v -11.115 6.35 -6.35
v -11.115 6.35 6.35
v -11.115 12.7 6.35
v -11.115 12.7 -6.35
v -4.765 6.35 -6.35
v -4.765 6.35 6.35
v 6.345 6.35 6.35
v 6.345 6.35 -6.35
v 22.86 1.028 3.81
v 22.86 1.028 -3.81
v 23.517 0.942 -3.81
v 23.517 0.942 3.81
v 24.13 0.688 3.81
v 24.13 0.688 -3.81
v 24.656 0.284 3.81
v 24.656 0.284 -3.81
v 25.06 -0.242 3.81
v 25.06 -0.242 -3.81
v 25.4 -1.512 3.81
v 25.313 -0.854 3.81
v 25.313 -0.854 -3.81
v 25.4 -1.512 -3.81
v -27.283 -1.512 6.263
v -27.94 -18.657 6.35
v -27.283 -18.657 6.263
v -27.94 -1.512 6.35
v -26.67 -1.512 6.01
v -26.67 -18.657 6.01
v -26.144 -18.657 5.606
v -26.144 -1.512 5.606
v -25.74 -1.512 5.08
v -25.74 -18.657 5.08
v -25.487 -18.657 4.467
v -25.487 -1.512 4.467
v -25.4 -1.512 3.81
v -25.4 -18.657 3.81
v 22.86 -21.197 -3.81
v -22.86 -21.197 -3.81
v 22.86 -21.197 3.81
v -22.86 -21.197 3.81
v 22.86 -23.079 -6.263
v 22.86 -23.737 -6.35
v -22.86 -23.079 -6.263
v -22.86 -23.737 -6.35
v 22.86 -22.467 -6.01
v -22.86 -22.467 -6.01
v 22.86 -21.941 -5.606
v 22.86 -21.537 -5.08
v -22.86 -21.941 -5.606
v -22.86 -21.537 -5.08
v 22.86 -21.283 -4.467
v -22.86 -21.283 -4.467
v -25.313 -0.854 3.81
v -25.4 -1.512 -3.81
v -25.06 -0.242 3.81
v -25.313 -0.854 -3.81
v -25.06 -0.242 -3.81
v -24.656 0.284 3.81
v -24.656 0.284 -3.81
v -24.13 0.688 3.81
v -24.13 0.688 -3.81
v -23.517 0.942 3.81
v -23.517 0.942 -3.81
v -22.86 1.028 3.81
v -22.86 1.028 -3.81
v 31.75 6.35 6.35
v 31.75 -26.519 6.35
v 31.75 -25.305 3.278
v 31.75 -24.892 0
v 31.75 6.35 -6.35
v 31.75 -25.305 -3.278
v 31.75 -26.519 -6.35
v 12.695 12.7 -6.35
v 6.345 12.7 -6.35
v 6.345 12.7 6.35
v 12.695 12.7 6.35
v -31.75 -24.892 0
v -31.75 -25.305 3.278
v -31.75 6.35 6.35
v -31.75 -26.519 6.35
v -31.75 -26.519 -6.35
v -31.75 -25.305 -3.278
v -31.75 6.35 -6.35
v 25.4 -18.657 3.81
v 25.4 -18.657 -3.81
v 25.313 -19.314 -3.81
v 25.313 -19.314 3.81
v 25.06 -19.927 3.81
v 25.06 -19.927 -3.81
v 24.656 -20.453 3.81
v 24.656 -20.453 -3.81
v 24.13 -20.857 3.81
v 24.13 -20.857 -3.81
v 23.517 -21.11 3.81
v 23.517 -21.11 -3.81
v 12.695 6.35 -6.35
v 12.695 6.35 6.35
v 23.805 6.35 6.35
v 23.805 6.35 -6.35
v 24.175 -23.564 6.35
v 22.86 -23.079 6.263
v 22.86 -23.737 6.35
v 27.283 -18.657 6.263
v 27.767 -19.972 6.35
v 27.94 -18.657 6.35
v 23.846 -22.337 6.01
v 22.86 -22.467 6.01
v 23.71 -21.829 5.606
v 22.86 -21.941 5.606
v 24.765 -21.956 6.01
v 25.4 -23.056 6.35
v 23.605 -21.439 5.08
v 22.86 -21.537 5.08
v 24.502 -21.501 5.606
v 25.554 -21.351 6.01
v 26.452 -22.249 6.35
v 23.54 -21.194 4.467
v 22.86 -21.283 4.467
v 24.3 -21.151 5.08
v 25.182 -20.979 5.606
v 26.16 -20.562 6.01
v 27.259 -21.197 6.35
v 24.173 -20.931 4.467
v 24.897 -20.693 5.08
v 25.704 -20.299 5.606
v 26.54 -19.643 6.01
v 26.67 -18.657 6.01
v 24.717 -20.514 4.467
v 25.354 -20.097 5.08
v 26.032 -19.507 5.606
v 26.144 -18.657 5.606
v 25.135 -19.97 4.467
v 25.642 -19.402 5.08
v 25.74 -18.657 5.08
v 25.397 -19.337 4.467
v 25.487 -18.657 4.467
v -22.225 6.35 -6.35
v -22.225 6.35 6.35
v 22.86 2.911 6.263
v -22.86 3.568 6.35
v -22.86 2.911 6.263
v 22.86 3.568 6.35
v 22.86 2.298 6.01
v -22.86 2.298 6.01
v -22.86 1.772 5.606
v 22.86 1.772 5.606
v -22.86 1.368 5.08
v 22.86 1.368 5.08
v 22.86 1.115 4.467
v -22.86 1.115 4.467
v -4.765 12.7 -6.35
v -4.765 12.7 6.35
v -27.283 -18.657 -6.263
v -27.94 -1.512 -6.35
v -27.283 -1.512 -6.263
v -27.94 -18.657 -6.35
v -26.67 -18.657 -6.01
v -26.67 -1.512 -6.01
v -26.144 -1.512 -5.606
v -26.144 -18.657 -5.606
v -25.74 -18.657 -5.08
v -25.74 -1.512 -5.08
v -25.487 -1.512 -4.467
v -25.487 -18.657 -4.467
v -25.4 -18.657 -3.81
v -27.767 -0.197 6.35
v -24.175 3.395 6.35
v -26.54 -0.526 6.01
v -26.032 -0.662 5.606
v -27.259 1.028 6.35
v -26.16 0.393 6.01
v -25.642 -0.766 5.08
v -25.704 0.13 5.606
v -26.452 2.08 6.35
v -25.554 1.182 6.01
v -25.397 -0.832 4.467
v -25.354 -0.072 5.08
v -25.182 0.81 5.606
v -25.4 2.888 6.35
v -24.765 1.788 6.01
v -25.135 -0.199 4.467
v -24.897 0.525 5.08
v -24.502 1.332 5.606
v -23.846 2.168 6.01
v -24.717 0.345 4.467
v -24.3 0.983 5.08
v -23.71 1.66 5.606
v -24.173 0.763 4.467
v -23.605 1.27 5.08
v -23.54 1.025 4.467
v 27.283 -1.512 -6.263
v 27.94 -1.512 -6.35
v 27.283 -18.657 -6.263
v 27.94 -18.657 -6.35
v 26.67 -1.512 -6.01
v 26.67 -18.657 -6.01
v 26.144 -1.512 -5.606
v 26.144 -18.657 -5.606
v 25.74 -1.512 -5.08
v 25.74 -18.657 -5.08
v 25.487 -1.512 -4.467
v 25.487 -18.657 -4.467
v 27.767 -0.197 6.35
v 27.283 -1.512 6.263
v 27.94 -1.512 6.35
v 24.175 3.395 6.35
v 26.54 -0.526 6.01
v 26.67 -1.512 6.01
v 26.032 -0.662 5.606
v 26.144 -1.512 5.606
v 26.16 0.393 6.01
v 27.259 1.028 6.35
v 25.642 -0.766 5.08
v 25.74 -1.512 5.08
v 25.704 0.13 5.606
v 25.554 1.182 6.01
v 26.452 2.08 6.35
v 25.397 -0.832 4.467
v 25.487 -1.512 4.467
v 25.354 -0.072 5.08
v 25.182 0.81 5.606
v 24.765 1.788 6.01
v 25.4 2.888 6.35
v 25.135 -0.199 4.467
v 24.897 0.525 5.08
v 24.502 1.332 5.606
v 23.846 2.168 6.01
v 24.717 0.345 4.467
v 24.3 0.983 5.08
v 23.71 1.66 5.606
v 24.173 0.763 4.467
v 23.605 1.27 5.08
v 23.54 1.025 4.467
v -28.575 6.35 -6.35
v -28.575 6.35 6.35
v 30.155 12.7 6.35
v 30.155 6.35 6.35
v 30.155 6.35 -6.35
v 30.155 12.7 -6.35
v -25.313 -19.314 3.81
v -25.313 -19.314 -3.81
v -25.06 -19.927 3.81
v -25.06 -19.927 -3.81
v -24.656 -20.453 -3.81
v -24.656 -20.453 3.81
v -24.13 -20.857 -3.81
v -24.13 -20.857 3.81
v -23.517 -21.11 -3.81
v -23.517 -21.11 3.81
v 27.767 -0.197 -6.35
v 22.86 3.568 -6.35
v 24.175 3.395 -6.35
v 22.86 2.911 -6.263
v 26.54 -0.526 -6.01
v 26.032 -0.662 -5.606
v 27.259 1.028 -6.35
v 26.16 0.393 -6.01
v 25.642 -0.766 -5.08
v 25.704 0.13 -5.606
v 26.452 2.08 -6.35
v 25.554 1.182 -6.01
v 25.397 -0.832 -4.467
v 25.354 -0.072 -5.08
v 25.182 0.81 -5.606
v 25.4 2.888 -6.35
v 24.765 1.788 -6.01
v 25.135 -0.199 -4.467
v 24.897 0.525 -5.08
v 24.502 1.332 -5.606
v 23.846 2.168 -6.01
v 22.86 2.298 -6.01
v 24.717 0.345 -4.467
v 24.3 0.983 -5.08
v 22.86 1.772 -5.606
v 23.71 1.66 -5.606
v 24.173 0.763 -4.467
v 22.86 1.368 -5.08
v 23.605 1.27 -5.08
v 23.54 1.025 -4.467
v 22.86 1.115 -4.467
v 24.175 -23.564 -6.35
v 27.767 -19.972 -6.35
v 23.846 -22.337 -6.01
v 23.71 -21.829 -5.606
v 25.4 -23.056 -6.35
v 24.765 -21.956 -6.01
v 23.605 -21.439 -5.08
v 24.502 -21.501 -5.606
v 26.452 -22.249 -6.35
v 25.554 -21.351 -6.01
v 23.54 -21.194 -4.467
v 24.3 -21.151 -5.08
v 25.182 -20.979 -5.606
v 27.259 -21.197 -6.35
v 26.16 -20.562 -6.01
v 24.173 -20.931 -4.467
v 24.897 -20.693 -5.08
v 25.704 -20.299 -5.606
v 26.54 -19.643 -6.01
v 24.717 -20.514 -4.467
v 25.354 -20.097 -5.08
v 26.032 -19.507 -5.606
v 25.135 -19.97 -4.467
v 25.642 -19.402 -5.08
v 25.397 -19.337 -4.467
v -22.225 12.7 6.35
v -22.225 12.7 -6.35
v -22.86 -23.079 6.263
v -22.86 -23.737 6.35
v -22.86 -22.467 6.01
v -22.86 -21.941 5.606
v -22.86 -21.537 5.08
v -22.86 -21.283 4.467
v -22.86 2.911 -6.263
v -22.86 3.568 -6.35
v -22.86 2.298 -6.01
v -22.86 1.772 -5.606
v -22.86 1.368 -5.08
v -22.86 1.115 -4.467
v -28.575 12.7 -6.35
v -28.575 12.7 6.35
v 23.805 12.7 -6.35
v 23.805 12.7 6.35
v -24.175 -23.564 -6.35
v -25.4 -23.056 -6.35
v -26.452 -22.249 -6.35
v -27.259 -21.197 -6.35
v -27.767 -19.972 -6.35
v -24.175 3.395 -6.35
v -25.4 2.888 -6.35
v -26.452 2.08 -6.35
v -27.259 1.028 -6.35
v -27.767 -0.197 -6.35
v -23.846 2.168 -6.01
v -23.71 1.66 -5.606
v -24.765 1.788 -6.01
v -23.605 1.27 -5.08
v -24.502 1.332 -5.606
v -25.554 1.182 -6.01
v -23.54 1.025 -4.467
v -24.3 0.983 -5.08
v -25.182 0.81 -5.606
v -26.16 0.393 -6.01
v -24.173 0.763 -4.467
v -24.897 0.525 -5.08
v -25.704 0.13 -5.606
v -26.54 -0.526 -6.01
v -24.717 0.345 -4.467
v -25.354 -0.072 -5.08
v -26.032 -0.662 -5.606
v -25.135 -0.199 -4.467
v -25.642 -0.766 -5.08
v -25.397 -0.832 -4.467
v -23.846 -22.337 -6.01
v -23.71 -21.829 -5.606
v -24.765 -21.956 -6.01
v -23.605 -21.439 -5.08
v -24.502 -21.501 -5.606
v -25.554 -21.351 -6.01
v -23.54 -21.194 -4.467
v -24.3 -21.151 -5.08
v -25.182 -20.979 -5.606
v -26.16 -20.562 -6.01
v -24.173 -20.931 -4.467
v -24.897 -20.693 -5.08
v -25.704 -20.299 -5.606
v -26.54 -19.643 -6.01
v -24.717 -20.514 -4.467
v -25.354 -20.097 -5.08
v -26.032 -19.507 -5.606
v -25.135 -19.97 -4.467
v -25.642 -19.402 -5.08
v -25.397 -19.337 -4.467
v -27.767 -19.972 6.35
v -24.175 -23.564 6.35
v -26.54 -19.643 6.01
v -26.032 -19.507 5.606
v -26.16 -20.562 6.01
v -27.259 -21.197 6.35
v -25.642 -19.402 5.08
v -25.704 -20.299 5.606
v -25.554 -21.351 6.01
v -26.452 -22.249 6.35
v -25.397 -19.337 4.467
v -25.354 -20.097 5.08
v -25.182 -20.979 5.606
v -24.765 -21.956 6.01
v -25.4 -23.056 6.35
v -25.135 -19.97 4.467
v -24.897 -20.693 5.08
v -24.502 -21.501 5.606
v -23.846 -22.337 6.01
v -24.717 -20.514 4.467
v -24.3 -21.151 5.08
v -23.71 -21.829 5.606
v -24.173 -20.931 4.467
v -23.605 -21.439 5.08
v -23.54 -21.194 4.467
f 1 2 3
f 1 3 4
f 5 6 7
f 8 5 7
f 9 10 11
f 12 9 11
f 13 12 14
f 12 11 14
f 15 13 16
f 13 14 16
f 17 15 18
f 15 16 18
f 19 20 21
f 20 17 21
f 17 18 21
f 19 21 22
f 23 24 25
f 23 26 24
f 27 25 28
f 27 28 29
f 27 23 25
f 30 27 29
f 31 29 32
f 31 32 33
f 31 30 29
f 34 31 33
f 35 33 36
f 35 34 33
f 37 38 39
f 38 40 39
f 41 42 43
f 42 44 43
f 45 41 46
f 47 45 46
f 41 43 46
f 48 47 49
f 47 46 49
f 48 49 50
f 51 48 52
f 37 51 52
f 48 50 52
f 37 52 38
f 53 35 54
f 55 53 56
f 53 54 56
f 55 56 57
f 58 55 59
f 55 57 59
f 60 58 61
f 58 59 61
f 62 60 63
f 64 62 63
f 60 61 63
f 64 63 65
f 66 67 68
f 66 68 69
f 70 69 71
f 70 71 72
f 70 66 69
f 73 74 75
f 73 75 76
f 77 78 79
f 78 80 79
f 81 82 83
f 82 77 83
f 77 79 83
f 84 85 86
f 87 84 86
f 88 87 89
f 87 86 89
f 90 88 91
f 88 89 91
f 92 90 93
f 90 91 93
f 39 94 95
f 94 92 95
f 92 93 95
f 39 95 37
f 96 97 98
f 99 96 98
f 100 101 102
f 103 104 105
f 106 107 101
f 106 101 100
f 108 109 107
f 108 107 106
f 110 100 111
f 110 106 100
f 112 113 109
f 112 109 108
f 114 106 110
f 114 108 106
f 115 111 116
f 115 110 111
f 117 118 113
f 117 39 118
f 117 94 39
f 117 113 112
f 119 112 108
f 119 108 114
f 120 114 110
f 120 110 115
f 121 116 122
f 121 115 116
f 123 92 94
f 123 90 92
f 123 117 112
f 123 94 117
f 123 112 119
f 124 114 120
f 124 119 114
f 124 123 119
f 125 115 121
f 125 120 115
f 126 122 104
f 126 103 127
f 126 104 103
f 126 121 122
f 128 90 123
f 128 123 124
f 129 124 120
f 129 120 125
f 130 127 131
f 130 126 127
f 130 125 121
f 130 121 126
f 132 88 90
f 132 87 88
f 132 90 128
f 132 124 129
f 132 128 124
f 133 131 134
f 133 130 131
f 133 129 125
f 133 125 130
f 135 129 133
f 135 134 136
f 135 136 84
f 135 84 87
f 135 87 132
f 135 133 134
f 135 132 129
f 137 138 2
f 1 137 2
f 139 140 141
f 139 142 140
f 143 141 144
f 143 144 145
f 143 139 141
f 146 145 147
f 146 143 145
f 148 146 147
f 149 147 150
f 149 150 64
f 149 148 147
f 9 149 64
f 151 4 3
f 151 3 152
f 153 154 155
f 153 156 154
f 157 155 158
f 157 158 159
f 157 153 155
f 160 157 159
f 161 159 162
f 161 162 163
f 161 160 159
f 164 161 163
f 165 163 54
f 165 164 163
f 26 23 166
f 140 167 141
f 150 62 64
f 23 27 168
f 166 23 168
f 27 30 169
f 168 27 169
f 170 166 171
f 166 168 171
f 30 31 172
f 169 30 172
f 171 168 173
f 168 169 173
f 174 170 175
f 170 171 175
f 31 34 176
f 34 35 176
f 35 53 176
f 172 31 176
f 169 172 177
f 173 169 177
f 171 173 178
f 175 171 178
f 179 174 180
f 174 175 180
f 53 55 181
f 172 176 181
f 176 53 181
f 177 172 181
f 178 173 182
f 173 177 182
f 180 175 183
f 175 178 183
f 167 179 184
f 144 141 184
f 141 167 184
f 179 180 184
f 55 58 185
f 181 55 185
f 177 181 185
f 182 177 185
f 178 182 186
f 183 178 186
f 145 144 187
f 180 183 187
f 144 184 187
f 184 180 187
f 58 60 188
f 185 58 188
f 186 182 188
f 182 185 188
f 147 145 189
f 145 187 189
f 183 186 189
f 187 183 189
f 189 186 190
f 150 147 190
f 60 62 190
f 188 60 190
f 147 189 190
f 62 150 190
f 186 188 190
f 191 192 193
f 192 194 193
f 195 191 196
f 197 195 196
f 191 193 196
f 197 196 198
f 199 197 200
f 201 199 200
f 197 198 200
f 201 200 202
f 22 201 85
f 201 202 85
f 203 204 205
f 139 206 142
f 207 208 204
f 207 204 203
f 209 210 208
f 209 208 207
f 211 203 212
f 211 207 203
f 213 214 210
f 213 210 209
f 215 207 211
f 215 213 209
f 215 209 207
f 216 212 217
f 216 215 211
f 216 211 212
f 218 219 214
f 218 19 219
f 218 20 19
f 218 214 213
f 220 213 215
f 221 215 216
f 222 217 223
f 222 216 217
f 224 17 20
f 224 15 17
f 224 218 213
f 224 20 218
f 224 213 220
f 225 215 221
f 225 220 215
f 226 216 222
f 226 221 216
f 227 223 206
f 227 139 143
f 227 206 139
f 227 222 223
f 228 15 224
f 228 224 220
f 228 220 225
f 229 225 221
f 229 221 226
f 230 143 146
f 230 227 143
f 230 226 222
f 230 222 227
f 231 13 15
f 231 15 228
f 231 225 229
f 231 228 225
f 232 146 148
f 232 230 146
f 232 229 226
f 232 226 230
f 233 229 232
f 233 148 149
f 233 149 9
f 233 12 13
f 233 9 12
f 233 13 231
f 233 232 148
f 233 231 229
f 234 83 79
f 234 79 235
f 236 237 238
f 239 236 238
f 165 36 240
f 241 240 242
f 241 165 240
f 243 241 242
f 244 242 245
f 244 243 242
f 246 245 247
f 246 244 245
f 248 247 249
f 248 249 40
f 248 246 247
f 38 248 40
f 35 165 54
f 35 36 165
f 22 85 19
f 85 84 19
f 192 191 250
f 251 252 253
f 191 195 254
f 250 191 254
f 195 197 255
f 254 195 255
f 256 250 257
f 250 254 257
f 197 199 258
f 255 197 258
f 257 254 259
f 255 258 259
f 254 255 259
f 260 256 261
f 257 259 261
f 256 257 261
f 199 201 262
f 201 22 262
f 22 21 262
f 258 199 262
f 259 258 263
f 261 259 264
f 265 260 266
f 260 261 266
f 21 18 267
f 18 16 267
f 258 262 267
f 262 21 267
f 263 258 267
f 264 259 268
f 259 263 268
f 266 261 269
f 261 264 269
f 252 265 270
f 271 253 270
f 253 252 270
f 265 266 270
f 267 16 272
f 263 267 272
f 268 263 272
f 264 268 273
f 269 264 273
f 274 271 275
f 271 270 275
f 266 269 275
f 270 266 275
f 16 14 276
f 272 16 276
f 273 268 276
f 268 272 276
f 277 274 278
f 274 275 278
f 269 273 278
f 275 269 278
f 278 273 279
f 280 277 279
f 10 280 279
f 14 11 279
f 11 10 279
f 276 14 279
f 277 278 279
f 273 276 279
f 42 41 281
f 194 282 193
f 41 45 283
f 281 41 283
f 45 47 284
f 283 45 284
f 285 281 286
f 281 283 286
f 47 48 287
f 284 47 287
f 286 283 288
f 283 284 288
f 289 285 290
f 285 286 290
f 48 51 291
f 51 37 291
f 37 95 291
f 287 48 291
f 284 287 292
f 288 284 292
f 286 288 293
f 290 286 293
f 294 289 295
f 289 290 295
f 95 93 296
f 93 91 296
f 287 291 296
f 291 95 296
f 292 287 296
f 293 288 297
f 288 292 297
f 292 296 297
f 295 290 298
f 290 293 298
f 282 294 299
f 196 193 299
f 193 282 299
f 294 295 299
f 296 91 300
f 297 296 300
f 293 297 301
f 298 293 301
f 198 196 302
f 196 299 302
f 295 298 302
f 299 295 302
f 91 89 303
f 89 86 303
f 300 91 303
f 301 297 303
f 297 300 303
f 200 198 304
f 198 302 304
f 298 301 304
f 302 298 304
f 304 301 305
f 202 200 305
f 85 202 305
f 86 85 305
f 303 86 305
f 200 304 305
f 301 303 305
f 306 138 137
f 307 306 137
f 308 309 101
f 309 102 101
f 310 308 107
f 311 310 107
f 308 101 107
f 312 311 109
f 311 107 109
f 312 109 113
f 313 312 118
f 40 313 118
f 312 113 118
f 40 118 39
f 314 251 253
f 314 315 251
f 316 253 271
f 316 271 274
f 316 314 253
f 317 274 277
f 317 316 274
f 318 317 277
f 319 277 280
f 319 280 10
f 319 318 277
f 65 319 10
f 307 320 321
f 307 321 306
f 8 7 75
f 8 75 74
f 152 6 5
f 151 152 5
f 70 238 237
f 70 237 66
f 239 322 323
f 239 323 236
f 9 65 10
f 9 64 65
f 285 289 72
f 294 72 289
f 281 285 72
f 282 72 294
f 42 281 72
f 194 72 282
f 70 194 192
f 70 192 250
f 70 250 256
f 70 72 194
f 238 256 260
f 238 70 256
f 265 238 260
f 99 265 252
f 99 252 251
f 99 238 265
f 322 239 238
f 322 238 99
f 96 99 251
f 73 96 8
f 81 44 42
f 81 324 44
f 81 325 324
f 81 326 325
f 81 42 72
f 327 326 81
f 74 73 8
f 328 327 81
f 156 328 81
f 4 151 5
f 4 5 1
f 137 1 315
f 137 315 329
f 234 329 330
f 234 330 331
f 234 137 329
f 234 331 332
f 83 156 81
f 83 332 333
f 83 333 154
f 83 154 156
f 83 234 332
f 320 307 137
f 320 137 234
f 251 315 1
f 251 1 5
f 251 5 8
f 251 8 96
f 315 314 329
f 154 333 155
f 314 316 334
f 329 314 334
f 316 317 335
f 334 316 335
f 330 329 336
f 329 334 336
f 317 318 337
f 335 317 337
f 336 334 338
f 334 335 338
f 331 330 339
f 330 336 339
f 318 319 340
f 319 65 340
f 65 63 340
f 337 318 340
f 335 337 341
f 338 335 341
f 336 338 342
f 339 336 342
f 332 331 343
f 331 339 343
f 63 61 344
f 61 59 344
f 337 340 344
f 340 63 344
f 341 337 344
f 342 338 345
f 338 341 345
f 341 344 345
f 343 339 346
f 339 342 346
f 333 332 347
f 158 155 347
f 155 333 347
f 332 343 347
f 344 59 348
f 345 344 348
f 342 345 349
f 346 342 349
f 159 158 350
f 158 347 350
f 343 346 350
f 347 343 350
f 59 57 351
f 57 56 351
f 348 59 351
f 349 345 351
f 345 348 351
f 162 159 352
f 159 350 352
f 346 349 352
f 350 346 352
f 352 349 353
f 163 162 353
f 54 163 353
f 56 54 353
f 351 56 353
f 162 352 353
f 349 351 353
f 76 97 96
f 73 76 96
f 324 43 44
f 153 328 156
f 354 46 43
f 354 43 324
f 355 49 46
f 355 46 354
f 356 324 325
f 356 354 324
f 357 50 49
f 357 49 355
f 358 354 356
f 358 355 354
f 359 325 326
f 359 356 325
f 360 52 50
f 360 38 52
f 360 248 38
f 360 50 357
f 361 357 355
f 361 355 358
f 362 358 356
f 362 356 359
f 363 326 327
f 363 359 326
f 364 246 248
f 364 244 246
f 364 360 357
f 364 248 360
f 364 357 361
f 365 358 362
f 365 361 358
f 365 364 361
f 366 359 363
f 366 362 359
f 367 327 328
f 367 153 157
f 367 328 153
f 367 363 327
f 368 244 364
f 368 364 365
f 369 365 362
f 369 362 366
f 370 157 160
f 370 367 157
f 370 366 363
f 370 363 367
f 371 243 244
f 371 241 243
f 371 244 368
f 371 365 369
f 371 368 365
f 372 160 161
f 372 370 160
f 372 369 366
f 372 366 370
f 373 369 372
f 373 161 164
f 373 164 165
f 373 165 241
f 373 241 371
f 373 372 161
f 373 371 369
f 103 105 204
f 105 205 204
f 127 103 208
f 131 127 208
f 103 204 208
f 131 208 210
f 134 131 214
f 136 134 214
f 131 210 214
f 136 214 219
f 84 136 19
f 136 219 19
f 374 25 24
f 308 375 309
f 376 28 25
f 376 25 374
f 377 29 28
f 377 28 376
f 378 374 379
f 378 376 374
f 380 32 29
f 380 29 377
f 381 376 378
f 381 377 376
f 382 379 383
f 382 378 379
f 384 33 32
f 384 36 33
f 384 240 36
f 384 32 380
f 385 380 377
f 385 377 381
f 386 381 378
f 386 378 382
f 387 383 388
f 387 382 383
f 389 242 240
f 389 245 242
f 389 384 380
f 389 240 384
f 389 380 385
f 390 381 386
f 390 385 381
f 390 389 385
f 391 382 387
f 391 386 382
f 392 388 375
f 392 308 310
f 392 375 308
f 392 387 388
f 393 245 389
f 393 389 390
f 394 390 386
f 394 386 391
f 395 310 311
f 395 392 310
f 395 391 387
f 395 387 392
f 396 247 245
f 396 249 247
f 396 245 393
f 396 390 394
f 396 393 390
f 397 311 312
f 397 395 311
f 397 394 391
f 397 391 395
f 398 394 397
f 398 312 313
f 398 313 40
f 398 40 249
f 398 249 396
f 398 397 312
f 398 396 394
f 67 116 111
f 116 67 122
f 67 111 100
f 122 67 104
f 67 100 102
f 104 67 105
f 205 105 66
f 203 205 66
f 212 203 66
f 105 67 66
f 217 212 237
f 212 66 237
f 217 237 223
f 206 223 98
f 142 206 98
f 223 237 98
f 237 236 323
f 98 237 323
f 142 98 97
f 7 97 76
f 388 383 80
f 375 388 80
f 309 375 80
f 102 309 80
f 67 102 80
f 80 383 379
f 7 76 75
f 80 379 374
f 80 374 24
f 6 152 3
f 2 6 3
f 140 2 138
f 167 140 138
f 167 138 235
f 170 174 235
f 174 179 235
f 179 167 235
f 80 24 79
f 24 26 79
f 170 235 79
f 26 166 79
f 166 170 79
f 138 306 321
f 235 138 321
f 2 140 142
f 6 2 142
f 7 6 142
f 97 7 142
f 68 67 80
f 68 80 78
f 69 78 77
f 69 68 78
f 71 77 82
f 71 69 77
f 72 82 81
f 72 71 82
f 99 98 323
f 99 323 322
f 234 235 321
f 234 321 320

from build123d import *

# Parameters (mm, degrees)
SKETCH1_W             = 1.595
SKETCH1_H             = 12.7
BOSS_EXTRUDE1_DEPTH   = 6.35
SKETCH1_W_2           = 11.11
BOSS_EXTRUDE1_2_DEPTH = 6.35
BOSS_EXTRUDE1_3_DEPTH = 6.35
BOSS_EXTRUDE1_4_DEPTH = 6.35
SKETCH1_W_3           = 3.175
BOSS_EXTRUDE1_5_DEPTH = 6.35
SKETCH1_3_W           = 6.35
SKETCH1_3_H           = 12.7
BOSS_EXTRUDE2_DEPTH   = 12.7
SKETCH3_W             = 63.5
SKETCH3_H             = 12.7
BOSS_EXTRUDE3_DEPTH   = 38.1
CUT_EXTRUDE1_DEPTH    = 75.324844433
SKETCH5_W             = 50.8
SKETCH5_H             = 22.225
CUT_EXTRUDE2_DEPTH    = 44.273418952
FILLET1_R             = 2.54


with BuildPart() as part:
    # Sketch1 → Boss-Extrude1 (new body)
    with BuildSketch(Plane(origin=(0, 0, 0), x_dir=(1, 0, 0), z_dir=(0, 1, 0))):
        with Locations((30.9525, 0)):
            Rectangle(SKETCH1_W, SKETCH1_H)
    extrude(amount=BOSS_EXTRUDE1_DEPTH)



with BuildPart() as body_2:
    # Sketch1 → Boss-Extrude1 2 (new body)
    with BuildSketch(Plane(origin=(0, 0, 0), x_dir=(1, 0, 0), z_dir=(0, 1, 0))):
        with Locations((18.25, 0)):
            Rectangle(SKETCH1_W_2, SKETCH1_H)
    extrude(amount=BOSS_EXTRUDE1_2_DEPTH)


with BuildPart() as body_3:
    # Sketch1 → Boss-Extrude1 3 (new body)
    with BuildSketch(Plane(origin=(0, 0, 0), x_dir=(1, 0, 0), z_dir=(0, 1, 0))):
        with Locations((0.79, 0)):
            Rectangle(SKETCH1_W_2, SKETCH1_H)
    extrude(amount=BOSS_EXTRUDE1_3_DEPTH)


with BuildPart() as body_4:
    # Sketch1 → Boss-Extrude1 4 (new body)
    with BuildSketch(Plane(origin=(0, 0, 0), x_dir=(1, 0, 0), z_dir=(0, 1, 0))):
        with Locations((-16.67, 0)):
            Rectangle(SKETCH1_W_2, SKETCH1_H)
    extrude(amount=BOSS_EXTRUDE1_4_DEPTH)


with BuildPart() as body_5:
    # Sketch1 → Boss-Extrude1 5 (new body)
    with BuildSketch(Plane(origin=(0, 0, 0), x_dir=(1, 0, 0), z_dir=(0, 1, 0))):
        with Locations((-30.1625, 0)):
            Rectangle(SKETCH1_W_3, SKETCH1_H)
    extrude(amount=BOSS_EXTRUDE1_5_DEPTH)


with BuildPart() as part_1:
    add(part.part)

    add(body_2.part)  # Boss-Extrude2 merges body 2

    add(body_3.part)  # Boss-Extrude2 merges body 3

    add(body_4.part)  # Boss-Extrude2 merges body 4

    add(body_5.part)  # Boss-Extrude2 merges body 5
    # Sketch1<3> → Boss-Extrude2 (add)
    with BuildSketch(Plane(origin=(0, 0, 0), x_dir=(1, 0, 0), z_dir=(0, 1, 0))):
        with Locations((26.98, 0)):
            Rectangle(SKETCH1_3_W, SKETCH1_3_H)
        with Locations((9.52, 0)):
            Rectangle(SKETCH1_3_W, SKETCH1_3_H)
        with Locations((-7.94, 0)):
            Rectangle(SKETCH1_3_W, SKETCH1_3_H)
        with Locations((-25.4, 0)):
            Rectangle(SKETCH1_3_W, SKETCH1_3_H)
    extrude(amount=BOSS_EXTRUDE2_DEPTH)

    # Sketch3 → Boss-Extrude3 (add)
    with BuildSketch(Plane(origin=(0, 0, 0), x_dir=(-1, 0, 0), z_dir=(0, -1, 0))):
        Rectangle(SKETCH3_W, SKETCH3_H)
    extrude(amount=BOSS_EXTRUDE3_DEPTH)

    # Sketch4 → Cut-Extrude1 (cut, through all)
    with BuildSketch(Plane(origin=(31.75, 0, 0), x_dir=(0, 0, -1), z_dir=(1, 0, 0))):
        with BuildLine():
            Line((6.35, -26.518602675), (6.35, -38.1))
            Line((6.35, -38.1), (-6.35, -38.1))
            Line((-6.35, -38.1), (-6.35, -26.518602675))
            ThreePointArc((-6.35, -26.518602675), (0, -24.892), (6.35, -26.518602675))
        make_face()
    extrude(amount=-CUT_EXTRUDE1_DEPTH, mode=Mode.SUBTRACT)

    # Sketch5 → Cut-Extrude2 (cut, through all)
    with BuildSketch(Plane.XY.offset(6.35)):
        with Locations((0, -10.084301337)):
            Rectangle(SKETCH5_W, SKETCH5_H)
    extrude(amount=-CUT_EXTRUDE2_DEPTH, mode=Mode.SUBTRACT)

    # Fillet1
    fillet1_edges = [part_1.edges().sort_by_distance(p)[0] for p in [
        (25.4, -10.084301337, 6.35),
        (25.4, -10.084301337, -6.35),
        (0, -21.196801337, 6.35),
        (0, -21.196801337, -6.35),
        (-25.4, -10.084301337, -6.35),
        (-25.4, -10.084301337, 6.35),
        (0, 1.028198663, -6.35),
        (0, 1.028198663, 6.35),
        (-25.4, 1.028198663, 0),
        (-25.4, -21.196801337, 0),
        (25.4, -21.196801337, 0),
        (25.4, 1.028198663, 0),
    ]]
    fillet(fillet1_edges, radius=FILLET1_R)


solid = part_1.part
